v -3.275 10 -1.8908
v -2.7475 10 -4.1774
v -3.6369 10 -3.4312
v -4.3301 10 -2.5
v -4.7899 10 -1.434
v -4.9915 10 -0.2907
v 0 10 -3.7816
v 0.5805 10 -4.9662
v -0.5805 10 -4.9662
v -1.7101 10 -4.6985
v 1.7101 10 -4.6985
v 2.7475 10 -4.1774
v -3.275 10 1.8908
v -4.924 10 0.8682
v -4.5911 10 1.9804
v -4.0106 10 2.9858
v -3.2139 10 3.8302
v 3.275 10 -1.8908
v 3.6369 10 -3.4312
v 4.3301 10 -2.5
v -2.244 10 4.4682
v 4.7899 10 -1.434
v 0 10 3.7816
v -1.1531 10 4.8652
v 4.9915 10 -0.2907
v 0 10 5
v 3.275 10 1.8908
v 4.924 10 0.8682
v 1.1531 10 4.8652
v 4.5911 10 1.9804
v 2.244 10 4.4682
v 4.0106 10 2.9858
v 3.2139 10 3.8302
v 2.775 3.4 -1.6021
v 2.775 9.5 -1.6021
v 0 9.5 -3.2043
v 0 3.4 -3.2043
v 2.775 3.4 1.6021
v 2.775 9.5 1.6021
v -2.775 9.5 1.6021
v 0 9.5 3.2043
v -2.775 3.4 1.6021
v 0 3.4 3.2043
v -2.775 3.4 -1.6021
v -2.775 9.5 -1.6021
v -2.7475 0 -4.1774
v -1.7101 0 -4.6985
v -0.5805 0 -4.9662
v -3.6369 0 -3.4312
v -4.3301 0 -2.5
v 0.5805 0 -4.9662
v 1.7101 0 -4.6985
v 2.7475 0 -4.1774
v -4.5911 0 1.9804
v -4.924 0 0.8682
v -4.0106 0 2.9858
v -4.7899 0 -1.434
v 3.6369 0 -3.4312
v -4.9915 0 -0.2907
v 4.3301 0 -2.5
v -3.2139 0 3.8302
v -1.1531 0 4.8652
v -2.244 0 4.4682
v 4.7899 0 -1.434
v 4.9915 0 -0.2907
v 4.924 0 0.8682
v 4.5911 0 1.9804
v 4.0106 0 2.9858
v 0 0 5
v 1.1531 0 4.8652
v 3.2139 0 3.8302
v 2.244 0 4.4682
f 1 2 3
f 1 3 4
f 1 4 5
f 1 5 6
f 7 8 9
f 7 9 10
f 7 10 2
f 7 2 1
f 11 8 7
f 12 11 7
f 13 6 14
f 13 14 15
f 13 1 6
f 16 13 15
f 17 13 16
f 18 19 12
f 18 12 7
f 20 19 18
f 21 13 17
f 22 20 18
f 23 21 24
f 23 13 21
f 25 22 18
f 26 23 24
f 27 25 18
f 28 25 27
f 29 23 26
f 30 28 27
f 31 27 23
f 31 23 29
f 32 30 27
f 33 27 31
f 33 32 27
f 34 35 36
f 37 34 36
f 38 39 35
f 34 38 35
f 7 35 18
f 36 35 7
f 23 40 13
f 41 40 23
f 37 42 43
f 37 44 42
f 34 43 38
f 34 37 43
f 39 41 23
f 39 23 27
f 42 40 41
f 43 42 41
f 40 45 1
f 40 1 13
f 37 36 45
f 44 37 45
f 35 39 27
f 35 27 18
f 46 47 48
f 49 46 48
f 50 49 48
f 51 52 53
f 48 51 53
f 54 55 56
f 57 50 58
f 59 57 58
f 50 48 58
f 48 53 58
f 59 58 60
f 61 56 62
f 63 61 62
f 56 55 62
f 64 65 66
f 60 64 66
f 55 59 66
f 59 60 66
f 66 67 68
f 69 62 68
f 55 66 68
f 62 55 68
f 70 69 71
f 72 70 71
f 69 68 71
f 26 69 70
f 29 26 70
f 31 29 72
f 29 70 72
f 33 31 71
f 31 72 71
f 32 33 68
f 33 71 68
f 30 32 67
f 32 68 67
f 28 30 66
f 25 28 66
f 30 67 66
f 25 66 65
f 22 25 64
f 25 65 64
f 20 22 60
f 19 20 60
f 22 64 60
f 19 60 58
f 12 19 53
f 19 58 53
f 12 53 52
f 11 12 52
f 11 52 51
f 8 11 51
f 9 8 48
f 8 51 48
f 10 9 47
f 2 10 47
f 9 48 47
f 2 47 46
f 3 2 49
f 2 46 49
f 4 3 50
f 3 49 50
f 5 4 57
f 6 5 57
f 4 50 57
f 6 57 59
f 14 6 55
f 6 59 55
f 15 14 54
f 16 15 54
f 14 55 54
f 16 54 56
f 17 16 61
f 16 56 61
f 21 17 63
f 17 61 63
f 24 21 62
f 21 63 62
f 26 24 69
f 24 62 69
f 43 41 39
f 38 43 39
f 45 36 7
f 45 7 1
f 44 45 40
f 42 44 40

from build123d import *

# Parameters (mm, degrees)
SKETCH1_R           = 5
BOSS_EXTRUDE1_DEPTH = 10
CUT_EXTRUDE1_DEPTH  = 6.6
CHAMFER1_SIZE       = 0.5


with BuildPart() as part:
    # Sketch1 → Boss-Extrude1 (new body)
    with BuildSketch(Plane(origin=(0, 0, 0), x_dir=(1, 0, 0), z_dir=(0, 1, 0))):
        with Locations(Location((0, 0, 0), (0, 0, 270))):
            Circle(SKETCH1_R)
        Polygon((2.775, -1.602146997), (2.775, 1.602146997), (0, 3.204293994), (-2.775, 1.602146997), (-2.775, -1.602146997), (0, -3.204293994), align=None, mode=Mode.SUBTRACT)
        Polygon((0, -3.204293994), (2.775, -1.602146997), (2.775, 1.602146997), (0, 3.204293994), (-2.775, 1.602146997), (-2.775, -1.602146997), align=None)
    extrude(amount=BOSS_EXTRUDE1_DEPTH)

    # Sketch2 → Cut-Extrude1 (cut)
    with BuildSketch(Plane(origin=(0, 10, 0), x_dir=(1, 0, 0), z_dir=(0, 1, 0))):
        Polygon((-2.775, -1.602146997), (0, -3.204293994), (2.775, -1.602146997), (2.775, 1.602146997), (0, 3.204293994), (-2.775, 1.602146997), align=None)
    extrude(amount=-CUT_EXTRUDE1_DEPTH, mode=Mode.SUBTRACT)

    # Chamfer1
    chamfer1_edges = [part.edges().sort_by_distance(p)[0] for p in [
        (-2.775, 10, 0),
        (-1.3875, 10, 2.403220496),
        (1.3875, 10, 2.403220496),
        (2.775, 10, 0),
        (1.3875, 10, -2.403220496),
        (-1.3875, 10, -2.403220496),
    ]]
    chamfer(chamfer1_edges, length=CHAMFER1_SIZE)


solid = part.part
